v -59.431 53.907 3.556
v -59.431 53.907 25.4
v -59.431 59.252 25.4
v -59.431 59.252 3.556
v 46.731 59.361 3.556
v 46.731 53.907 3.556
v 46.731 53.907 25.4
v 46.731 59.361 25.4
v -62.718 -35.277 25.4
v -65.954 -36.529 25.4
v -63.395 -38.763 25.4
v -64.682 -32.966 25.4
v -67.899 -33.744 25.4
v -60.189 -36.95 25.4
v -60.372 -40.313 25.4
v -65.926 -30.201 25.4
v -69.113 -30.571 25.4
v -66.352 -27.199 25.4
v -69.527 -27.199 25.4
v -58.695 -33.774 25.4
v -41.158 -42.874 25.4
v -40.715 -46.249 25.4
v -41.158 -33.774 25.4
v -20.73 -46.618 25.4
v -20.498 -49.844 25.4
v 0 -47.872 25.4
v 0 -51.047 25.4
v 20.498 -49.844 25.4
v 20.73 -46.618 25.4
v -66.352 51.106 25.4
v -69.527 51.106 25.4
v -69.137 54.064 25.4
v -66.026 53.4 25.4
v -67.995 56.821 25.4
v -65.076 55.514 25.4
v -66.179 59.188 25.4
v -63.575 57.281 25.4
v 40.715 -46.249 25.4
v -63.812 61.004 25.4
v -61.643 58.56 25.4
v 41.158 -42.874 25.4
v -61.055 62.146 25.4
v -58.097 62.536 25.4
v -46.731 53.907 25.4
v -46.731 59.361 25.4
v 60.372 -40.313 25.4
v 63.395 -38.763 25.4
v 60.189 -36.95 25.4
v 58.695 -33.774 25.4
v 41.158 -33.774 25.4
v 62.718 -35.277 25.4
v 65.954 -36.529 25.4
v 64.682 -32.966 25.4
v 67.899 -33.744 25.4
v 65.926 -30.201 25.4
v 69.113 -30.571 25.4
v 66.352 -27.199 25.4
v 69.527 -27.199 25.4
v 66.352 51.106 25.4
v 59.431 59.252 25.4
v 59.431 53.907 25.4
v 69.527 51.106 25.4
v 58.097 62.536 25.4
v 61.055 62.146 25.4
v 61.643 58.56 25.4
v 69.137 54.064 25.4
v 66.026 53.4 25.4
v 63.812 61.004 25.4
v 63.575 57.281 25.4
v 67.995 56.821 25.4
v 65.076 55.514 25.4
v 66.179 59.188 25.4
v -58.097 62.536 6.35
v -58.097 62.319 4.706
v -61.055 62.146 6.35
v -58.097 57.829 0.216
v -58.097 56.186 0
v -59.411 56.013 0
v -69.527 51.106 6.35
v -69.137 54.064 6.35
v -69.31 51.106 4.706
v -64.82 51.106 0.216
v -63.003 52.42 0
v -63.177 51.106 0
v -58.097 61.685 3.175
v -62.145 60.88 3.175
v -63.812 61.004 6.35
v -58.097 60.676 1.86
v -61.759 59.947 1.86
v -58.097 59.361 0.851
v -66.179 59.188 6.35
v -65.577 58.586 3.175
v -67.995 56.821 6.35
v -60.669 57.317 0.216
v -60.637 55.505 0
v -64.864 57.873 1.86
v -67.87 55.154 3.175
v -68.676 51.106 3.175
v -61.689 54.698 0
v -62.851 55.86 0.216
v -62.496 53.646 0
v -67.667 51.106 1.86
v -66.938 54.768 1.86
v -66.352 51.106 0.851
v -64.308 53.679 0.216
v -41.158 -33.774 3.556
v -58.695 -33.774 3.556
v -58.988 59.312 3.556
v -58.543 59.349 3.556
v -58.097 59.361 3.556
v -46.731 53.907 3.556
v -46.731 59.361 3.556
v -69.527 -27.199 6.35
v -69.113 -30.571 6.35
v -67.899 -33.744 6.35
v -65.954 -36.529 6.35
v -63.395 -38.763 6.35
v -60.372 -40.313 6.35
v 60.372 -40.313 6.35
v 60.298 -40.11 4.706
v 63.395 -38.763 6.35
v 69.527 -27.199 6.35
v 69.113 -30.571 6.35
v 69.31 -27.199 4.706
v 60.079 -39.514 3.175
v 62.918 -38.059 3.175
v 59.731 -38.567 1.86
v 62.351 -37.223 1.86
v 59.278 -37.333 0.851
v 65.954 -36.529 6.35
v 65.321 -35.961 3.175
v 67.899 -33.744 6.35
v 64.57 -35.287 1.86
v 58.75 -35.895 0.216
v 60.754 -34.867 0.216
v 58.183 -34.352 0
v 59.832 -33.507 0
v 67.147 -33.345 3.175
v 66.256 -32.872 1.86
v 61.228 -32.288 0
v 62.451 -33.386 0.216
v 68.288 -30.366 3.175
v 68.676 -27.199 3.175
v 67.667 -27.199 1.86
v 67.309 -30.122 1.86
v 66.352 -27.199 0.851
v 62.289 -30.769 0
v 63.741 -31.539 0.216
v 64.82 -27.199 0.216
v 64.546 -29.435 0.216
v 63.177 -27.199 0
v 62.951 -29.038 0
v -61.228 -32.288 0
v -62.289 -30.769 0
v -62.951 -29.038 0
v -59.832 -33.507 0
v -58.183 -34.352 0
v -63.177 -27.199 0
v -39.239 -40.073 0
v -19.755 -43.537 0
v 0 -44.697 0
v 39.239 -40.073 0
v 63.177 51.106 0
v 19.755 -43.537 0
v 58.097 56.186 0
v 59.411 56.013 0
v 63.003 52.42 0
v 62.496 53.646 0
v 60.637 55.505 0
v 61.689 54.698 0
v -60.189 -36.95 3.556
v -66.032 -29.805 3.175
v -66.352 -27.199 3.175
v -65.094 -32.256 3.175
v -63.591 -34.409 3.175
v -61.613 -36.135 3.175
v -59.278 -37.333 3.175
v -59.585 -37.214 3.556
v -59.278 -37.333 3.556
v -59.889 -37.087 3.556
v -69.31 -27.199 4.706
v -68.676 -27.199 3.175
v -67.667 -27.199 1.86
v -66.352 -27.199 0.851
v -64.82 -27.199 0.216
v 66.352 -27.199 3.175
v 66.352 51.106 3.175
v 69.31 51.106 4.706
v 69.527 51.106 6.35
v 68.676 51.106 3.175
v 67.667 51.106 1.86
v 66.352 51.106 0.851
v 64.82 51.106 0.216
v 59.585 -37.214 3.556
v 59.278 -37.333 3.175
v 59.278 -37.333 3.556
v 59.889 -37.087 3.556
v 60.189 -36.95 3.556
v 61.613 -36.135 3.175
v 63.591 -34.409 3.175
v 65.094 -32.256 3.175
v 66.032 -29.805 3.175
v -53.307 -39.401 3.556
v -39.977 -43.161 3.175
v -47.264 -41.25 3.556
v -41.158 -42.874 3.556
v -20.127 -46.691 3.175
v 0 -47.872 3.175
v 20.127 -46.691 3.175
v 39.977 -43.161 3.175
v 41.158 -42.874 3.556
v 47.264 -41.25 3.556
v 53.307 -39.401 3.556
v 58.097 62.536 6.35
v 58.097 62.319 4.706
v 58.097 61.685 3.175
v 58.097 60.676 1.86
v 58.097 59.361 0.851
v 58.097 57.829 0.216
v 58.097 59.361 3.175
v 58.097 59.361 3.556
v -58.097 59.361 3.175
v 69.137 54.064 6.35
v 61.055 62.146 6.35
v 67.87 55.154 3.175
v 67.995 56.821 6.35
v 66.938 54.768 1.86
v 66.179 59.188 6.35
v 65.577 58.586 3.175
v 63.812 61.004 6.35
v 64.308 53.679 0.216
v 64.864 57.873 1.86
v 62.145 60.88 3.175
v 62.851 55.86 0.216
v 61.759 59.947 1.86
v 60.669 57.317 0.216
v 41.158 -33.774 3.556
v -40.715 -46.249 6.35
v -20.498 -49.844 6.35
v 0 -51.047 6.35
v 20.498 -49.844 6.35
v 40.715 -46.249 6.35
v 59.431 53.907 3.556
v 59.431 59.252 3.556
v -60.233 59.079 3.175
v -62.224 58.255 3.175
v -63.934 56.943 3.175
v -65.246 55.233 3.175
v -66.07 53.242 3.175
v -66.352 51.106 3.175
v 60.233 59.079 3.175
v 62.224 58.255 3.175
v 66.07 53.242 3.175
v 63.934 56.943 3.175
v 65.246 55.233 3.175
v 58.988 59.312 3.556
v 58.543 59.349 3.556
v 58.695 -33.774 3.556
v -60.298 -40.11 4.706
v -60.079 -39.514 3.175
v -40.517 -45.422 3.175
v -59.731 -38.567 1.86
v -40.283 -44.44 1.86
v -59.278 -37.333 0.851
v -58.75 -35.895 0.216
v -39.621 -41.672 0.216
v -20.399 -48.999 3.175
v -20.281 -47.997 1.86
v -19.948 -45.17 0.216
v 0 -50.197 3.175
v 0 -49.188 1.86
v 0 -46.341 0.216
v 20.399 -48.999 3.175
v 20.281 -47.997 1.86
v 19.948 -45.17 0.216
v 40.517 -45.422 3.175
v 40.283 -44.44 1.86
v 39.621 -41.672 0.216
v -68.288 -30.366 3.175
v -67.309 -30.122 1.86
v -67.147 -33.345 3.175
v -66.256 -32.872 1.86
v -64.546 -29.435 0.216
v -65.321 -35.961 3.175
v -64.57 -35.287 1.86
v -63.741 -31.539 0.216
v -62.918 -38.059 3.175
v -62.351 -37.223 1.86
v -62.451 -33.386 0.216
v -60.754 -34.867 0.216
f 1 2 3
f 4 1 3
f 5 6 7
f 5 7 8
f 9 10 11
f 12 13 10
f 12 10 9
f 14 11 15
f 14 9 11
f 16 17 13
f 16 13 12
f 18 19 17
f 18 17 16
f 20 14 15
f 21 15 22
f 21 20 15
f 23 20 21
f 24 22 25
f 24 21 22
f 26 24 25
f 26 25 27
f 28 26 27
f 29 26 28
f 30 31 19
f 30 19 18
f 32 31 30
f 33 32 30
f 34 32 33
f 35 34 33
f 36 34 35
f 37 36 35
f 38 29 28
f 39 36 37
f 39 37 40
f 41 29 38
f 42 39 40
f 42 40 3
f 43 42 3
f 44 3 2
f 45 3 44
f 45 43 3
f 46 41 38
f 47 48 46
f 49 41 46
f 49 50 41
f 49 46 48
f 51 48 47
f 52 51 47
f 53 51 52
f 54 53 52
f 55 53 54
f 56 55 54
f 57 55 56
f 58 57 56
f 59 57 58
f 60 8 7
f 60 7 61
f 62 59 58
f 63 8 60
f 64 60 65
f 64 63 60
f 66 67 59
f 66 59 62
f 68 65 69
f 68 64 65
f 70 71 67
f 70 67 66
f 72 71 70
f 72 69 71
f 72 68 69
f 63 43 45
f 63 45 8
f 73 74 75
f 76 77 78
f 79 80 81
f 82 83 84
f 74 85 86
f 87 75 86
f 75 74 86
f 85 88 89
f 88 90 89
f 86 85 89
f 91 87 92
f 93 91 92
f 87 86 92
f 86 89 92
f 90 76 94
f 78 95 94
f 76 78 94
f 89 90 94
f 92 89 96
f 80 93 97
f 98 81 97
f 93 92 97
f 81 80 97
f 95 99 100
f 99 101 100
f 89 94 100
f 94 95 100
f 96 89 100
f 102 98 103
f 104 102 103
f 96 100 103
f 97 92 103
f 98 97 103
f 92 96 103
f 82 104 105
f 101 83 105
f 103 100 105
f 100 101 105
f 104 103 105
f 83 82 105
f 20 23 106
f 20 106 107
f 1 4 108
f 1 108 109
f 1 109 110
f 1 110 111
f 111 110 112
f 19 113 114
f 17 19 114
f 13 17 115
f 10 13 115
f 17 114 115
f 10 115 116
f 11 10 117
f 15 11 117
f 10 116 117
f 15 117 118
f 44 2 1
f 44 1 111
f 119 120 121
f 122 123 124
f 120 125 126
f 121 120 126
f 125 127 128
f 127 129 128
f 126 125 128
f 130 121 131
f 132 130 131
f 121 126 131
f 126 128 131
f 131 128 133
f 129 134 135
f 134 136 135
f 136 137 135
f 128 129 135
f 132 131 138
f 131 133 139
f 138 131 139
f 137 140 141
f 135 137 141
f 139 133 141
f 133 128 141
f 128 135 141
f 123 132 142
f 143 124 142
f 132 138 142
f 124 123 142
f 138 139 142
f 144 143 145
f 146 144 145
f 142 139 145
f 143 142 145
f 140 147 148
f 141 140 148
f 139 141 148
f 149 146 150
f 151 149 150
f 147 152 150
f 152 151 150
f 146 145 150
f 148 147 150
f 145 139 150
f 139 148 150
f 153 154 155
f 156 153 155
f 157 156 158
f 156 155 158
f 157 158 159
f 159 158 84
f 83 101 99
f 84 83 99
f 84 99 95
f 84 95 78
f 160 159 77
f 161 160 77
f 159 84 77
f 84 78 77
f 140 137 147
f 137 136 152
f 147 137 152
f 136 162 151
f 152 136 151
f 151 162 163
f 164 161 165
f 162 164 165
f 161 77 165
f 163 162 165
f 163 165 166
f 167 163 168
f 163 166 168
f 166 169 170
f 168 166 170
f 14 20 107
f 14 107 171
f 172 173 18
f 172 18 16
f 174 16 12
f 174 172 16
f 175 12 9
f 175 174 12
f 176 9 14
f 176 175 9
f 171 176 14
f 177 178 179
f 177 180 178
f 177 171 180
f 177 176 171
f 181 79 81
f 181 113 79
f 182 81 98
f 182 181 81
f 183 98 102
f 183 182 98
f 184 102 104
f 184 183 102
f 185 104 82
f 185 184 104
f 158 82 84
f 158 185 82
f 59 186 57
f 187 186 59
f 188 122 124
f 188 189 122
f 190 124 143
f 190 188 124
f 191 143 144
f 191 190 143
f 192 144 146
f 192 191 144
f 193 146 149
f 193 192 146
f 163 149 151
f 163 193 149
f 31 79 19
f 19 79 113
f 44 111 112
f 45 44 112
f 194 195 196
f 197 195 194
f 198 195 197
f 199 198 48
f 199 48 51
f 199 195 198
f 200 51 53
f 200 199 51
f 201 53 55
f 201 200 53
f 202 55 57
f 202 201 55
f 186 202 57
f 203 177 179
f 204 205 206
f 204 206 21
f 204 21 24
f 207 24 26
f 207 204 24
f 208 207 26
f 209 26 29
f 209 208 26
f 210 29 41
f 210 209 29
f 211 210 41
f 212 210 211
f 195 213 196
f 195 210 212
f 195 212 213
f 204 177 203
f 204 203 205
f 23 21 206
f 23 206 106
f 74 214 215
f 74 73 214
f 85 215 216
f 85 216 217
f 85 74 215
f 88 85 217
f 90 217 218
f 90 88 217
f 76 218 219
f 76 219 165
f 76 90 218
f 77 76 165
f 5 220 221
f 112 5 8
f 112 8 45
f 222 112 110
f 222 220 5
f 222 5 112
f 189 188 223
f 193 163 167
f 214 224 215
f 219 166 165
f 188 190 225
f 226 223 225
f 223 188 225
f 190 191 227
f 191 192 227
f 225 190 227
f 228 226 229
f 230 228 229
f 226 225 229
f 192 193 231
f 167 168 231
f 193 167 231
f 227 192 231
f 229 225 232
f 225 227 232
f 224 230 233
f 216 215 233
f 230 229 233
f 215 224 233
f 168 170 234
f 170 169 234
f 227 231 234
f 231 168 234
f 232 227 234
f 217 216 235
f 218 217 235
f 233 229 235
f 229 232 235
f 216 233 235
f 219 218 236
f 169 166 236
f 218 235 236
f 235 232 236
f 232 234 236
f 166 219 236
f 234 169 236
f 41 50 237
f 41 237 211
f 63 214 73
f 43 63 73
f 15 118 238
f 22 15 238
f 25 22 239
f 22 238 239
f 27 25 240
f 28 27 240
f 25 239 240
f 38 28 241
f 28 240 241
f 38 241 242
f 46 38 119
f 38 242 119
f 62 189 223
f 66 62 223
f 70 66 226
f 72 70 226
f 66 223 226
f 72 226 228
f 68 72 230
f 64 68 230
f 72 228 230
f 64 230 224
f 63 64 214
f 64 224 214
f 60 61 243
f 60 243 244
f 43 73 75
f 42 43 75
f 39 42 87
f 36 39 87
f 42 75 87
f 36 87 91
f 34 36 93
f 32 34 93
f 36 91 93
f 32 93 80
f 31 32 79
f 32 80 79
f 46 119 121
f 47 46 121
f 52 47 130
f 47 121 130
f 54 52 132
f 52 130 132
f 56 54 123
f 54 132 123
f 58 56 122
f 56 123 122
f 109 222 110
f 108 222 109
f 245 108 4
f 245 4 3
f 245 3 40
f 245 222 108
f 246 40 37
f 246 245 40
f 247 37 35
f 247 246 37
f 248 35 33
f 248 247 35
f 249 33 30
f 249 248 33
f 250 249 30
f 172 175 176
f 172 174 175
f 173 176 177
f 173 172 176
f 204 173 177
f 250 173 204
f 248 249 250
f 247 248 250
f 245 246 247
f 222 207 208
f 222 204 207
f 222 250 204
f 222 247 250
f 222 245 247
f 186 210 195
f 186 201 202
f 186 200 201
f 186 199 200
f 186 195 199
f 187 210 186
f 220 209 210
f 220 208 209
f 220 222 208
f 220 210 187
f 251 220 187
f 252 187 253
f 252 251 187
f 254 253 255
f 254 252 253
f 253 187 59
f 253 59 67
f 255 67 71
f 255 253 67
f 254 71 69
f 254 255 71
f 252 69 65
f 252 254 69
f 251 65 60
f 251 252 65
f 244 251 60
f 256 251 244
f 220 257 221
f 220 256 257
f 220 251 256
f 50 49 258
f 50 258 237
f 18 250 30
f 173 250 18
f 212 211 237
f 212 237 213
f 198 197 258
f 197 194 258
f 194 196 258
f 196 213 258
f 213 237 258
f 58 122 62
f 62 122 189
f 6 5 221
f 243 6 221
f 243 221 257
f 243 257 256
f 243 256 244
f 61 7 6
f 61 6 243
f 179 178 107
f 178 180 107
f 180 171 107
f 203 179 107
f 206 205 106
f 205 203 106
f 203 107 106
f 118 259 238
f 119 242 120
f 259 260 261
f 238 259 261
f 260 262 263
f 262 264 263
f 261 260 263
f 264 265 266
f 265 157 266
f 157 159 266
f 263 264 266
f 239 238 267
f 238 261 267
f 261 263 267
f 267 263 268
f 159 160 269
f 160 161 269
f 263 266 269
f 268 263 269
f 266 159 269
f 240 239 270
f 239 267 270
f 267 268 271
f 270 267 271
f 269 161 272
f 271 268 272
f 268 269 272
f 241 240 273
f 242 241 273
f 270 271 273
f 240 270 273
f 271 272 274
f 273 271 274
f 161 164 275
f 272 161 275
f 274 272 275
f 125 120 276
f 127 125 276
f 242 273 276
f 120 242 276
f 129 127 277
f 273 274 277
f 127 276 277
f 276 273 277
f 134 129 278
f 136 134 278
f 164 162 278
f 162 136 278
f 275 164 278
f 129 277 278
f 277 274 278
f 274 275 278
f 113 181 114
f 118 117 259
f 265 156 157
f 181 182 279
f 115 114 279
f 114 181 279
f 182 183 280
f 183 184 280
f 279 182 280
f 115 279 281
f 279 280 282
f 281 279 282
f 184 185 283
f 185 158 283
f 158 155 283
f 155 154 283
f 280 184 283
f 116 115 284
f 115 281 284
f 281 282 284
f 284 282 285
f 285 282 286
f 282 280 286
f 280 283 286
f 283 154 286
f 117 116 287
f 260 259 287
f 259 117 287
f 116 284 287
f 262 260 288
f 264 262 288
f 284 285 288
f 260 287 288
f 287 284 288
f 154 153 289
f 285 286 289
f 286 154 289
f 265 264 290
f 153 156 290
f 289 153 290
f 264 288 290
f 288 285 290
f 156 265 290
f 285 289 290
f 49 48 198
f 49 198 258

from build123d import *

# Parameters (mm, degrees)
F1_DEPTH = 25.4
F2_T     = -3.175
F3_R     = 6.35
F5_W     = 12.7
F5_H     = 6.35
F6_DEPTH = 21.844


# Not quite as in the source:
# - a feature names something its author has since deleted; it is built from what else it names


with BuildPart() as f1:
    # F0 (on Top) → F1 (new body)
    with BuildSketch(Plane.XY):
        with BuildLine():
            Line((58.0965084505, 62.5356453779), (-58.0965084505, 62.5356453779))
            ThreePointArc((-58.0965084505, 62.5356453779), (-66.1787389595, 59.1878758868), (-69.5265084505, 51.1056453779))
            Line((-69.5265084505, 51.1056453779), (-69.5265084505, -27.1992570698))
            ThreePointArc((-69.5265084505, -27.1992570698), (-67.0115325937, -35.1957139026), (-60.3721316603, -40.3130159932))
            ThreePointArc((-60.3721316603, -40.3130159932), (0, -51.0474727306), (60.3721316603, -40.3130159932))
            ThreePointArc((60.3721316603, -40.3130159932), (67.0115325937, -35.1957139026), (69.5265084505, -27.1992570698))
            Line((69.5265084505, -27.1992570698), (69.5265084505, 51.1056453779))
            ThreePointArc((69.5265084505, 51.1056453779), (66.1787389595, 59.1878758868), (58.0965084505, 62.5356453779))
        make_face()
    extrude(amount=F1_DEPTH)

    # F2
    f2_openings = [f1.faces().sort_by_distance(p)[0] for p in [
        (0, 7.919531, 25.4),
    ]]
    offset(amount=F2_T, openings=f2_openings)

    # F3
    f3_edges = [f1.edges().sort_by_distance(p)[0] for p in [
        (69.526508, 11.953194, 0),
        (66.178739, 59.187876, 0),
        (0, 62.535645, 0),
        (-66.178739, 59.187876, 0),
        (-69.526508, 11.953194, 0),
        (-67.011533, -35.195714, 0),
        (0, -51.047473, 0),
        (67.011533, -35.195714, 0),
    ]]
    fillet(f3_edges, radius=F3_R)

    # F5 (on offset) → F6 (join)
    with BuildSketch(Plane.XY.offset(25.4)):
        with Locations((-53.0805146158, 57.0815077901)):
            Rectangle(F5_W, F5_H)
        with Locations((53.0805146158, 57.0815077901)):
            Rectangle(F5_W, F5_H)
        Polygon((-41.1578565836, -33.773638308), (-58.6946308613, -33.773638308), (-60.6418885291, -37.9110425711), (-53.9016760886, -40.266495198), (-41.1578565836, -43.8219420612), align=None)
        Polygon((60.6418885291, -37.9110425711), (58.6946308613, -33.773638308), (41.1578565836, -33.773638308), (41.1578565836, -43.8219420612), (53.9016760886, -40.266495198), align=None)
    extrude(amount=-F6_DEPTH)


solid = f1.part
